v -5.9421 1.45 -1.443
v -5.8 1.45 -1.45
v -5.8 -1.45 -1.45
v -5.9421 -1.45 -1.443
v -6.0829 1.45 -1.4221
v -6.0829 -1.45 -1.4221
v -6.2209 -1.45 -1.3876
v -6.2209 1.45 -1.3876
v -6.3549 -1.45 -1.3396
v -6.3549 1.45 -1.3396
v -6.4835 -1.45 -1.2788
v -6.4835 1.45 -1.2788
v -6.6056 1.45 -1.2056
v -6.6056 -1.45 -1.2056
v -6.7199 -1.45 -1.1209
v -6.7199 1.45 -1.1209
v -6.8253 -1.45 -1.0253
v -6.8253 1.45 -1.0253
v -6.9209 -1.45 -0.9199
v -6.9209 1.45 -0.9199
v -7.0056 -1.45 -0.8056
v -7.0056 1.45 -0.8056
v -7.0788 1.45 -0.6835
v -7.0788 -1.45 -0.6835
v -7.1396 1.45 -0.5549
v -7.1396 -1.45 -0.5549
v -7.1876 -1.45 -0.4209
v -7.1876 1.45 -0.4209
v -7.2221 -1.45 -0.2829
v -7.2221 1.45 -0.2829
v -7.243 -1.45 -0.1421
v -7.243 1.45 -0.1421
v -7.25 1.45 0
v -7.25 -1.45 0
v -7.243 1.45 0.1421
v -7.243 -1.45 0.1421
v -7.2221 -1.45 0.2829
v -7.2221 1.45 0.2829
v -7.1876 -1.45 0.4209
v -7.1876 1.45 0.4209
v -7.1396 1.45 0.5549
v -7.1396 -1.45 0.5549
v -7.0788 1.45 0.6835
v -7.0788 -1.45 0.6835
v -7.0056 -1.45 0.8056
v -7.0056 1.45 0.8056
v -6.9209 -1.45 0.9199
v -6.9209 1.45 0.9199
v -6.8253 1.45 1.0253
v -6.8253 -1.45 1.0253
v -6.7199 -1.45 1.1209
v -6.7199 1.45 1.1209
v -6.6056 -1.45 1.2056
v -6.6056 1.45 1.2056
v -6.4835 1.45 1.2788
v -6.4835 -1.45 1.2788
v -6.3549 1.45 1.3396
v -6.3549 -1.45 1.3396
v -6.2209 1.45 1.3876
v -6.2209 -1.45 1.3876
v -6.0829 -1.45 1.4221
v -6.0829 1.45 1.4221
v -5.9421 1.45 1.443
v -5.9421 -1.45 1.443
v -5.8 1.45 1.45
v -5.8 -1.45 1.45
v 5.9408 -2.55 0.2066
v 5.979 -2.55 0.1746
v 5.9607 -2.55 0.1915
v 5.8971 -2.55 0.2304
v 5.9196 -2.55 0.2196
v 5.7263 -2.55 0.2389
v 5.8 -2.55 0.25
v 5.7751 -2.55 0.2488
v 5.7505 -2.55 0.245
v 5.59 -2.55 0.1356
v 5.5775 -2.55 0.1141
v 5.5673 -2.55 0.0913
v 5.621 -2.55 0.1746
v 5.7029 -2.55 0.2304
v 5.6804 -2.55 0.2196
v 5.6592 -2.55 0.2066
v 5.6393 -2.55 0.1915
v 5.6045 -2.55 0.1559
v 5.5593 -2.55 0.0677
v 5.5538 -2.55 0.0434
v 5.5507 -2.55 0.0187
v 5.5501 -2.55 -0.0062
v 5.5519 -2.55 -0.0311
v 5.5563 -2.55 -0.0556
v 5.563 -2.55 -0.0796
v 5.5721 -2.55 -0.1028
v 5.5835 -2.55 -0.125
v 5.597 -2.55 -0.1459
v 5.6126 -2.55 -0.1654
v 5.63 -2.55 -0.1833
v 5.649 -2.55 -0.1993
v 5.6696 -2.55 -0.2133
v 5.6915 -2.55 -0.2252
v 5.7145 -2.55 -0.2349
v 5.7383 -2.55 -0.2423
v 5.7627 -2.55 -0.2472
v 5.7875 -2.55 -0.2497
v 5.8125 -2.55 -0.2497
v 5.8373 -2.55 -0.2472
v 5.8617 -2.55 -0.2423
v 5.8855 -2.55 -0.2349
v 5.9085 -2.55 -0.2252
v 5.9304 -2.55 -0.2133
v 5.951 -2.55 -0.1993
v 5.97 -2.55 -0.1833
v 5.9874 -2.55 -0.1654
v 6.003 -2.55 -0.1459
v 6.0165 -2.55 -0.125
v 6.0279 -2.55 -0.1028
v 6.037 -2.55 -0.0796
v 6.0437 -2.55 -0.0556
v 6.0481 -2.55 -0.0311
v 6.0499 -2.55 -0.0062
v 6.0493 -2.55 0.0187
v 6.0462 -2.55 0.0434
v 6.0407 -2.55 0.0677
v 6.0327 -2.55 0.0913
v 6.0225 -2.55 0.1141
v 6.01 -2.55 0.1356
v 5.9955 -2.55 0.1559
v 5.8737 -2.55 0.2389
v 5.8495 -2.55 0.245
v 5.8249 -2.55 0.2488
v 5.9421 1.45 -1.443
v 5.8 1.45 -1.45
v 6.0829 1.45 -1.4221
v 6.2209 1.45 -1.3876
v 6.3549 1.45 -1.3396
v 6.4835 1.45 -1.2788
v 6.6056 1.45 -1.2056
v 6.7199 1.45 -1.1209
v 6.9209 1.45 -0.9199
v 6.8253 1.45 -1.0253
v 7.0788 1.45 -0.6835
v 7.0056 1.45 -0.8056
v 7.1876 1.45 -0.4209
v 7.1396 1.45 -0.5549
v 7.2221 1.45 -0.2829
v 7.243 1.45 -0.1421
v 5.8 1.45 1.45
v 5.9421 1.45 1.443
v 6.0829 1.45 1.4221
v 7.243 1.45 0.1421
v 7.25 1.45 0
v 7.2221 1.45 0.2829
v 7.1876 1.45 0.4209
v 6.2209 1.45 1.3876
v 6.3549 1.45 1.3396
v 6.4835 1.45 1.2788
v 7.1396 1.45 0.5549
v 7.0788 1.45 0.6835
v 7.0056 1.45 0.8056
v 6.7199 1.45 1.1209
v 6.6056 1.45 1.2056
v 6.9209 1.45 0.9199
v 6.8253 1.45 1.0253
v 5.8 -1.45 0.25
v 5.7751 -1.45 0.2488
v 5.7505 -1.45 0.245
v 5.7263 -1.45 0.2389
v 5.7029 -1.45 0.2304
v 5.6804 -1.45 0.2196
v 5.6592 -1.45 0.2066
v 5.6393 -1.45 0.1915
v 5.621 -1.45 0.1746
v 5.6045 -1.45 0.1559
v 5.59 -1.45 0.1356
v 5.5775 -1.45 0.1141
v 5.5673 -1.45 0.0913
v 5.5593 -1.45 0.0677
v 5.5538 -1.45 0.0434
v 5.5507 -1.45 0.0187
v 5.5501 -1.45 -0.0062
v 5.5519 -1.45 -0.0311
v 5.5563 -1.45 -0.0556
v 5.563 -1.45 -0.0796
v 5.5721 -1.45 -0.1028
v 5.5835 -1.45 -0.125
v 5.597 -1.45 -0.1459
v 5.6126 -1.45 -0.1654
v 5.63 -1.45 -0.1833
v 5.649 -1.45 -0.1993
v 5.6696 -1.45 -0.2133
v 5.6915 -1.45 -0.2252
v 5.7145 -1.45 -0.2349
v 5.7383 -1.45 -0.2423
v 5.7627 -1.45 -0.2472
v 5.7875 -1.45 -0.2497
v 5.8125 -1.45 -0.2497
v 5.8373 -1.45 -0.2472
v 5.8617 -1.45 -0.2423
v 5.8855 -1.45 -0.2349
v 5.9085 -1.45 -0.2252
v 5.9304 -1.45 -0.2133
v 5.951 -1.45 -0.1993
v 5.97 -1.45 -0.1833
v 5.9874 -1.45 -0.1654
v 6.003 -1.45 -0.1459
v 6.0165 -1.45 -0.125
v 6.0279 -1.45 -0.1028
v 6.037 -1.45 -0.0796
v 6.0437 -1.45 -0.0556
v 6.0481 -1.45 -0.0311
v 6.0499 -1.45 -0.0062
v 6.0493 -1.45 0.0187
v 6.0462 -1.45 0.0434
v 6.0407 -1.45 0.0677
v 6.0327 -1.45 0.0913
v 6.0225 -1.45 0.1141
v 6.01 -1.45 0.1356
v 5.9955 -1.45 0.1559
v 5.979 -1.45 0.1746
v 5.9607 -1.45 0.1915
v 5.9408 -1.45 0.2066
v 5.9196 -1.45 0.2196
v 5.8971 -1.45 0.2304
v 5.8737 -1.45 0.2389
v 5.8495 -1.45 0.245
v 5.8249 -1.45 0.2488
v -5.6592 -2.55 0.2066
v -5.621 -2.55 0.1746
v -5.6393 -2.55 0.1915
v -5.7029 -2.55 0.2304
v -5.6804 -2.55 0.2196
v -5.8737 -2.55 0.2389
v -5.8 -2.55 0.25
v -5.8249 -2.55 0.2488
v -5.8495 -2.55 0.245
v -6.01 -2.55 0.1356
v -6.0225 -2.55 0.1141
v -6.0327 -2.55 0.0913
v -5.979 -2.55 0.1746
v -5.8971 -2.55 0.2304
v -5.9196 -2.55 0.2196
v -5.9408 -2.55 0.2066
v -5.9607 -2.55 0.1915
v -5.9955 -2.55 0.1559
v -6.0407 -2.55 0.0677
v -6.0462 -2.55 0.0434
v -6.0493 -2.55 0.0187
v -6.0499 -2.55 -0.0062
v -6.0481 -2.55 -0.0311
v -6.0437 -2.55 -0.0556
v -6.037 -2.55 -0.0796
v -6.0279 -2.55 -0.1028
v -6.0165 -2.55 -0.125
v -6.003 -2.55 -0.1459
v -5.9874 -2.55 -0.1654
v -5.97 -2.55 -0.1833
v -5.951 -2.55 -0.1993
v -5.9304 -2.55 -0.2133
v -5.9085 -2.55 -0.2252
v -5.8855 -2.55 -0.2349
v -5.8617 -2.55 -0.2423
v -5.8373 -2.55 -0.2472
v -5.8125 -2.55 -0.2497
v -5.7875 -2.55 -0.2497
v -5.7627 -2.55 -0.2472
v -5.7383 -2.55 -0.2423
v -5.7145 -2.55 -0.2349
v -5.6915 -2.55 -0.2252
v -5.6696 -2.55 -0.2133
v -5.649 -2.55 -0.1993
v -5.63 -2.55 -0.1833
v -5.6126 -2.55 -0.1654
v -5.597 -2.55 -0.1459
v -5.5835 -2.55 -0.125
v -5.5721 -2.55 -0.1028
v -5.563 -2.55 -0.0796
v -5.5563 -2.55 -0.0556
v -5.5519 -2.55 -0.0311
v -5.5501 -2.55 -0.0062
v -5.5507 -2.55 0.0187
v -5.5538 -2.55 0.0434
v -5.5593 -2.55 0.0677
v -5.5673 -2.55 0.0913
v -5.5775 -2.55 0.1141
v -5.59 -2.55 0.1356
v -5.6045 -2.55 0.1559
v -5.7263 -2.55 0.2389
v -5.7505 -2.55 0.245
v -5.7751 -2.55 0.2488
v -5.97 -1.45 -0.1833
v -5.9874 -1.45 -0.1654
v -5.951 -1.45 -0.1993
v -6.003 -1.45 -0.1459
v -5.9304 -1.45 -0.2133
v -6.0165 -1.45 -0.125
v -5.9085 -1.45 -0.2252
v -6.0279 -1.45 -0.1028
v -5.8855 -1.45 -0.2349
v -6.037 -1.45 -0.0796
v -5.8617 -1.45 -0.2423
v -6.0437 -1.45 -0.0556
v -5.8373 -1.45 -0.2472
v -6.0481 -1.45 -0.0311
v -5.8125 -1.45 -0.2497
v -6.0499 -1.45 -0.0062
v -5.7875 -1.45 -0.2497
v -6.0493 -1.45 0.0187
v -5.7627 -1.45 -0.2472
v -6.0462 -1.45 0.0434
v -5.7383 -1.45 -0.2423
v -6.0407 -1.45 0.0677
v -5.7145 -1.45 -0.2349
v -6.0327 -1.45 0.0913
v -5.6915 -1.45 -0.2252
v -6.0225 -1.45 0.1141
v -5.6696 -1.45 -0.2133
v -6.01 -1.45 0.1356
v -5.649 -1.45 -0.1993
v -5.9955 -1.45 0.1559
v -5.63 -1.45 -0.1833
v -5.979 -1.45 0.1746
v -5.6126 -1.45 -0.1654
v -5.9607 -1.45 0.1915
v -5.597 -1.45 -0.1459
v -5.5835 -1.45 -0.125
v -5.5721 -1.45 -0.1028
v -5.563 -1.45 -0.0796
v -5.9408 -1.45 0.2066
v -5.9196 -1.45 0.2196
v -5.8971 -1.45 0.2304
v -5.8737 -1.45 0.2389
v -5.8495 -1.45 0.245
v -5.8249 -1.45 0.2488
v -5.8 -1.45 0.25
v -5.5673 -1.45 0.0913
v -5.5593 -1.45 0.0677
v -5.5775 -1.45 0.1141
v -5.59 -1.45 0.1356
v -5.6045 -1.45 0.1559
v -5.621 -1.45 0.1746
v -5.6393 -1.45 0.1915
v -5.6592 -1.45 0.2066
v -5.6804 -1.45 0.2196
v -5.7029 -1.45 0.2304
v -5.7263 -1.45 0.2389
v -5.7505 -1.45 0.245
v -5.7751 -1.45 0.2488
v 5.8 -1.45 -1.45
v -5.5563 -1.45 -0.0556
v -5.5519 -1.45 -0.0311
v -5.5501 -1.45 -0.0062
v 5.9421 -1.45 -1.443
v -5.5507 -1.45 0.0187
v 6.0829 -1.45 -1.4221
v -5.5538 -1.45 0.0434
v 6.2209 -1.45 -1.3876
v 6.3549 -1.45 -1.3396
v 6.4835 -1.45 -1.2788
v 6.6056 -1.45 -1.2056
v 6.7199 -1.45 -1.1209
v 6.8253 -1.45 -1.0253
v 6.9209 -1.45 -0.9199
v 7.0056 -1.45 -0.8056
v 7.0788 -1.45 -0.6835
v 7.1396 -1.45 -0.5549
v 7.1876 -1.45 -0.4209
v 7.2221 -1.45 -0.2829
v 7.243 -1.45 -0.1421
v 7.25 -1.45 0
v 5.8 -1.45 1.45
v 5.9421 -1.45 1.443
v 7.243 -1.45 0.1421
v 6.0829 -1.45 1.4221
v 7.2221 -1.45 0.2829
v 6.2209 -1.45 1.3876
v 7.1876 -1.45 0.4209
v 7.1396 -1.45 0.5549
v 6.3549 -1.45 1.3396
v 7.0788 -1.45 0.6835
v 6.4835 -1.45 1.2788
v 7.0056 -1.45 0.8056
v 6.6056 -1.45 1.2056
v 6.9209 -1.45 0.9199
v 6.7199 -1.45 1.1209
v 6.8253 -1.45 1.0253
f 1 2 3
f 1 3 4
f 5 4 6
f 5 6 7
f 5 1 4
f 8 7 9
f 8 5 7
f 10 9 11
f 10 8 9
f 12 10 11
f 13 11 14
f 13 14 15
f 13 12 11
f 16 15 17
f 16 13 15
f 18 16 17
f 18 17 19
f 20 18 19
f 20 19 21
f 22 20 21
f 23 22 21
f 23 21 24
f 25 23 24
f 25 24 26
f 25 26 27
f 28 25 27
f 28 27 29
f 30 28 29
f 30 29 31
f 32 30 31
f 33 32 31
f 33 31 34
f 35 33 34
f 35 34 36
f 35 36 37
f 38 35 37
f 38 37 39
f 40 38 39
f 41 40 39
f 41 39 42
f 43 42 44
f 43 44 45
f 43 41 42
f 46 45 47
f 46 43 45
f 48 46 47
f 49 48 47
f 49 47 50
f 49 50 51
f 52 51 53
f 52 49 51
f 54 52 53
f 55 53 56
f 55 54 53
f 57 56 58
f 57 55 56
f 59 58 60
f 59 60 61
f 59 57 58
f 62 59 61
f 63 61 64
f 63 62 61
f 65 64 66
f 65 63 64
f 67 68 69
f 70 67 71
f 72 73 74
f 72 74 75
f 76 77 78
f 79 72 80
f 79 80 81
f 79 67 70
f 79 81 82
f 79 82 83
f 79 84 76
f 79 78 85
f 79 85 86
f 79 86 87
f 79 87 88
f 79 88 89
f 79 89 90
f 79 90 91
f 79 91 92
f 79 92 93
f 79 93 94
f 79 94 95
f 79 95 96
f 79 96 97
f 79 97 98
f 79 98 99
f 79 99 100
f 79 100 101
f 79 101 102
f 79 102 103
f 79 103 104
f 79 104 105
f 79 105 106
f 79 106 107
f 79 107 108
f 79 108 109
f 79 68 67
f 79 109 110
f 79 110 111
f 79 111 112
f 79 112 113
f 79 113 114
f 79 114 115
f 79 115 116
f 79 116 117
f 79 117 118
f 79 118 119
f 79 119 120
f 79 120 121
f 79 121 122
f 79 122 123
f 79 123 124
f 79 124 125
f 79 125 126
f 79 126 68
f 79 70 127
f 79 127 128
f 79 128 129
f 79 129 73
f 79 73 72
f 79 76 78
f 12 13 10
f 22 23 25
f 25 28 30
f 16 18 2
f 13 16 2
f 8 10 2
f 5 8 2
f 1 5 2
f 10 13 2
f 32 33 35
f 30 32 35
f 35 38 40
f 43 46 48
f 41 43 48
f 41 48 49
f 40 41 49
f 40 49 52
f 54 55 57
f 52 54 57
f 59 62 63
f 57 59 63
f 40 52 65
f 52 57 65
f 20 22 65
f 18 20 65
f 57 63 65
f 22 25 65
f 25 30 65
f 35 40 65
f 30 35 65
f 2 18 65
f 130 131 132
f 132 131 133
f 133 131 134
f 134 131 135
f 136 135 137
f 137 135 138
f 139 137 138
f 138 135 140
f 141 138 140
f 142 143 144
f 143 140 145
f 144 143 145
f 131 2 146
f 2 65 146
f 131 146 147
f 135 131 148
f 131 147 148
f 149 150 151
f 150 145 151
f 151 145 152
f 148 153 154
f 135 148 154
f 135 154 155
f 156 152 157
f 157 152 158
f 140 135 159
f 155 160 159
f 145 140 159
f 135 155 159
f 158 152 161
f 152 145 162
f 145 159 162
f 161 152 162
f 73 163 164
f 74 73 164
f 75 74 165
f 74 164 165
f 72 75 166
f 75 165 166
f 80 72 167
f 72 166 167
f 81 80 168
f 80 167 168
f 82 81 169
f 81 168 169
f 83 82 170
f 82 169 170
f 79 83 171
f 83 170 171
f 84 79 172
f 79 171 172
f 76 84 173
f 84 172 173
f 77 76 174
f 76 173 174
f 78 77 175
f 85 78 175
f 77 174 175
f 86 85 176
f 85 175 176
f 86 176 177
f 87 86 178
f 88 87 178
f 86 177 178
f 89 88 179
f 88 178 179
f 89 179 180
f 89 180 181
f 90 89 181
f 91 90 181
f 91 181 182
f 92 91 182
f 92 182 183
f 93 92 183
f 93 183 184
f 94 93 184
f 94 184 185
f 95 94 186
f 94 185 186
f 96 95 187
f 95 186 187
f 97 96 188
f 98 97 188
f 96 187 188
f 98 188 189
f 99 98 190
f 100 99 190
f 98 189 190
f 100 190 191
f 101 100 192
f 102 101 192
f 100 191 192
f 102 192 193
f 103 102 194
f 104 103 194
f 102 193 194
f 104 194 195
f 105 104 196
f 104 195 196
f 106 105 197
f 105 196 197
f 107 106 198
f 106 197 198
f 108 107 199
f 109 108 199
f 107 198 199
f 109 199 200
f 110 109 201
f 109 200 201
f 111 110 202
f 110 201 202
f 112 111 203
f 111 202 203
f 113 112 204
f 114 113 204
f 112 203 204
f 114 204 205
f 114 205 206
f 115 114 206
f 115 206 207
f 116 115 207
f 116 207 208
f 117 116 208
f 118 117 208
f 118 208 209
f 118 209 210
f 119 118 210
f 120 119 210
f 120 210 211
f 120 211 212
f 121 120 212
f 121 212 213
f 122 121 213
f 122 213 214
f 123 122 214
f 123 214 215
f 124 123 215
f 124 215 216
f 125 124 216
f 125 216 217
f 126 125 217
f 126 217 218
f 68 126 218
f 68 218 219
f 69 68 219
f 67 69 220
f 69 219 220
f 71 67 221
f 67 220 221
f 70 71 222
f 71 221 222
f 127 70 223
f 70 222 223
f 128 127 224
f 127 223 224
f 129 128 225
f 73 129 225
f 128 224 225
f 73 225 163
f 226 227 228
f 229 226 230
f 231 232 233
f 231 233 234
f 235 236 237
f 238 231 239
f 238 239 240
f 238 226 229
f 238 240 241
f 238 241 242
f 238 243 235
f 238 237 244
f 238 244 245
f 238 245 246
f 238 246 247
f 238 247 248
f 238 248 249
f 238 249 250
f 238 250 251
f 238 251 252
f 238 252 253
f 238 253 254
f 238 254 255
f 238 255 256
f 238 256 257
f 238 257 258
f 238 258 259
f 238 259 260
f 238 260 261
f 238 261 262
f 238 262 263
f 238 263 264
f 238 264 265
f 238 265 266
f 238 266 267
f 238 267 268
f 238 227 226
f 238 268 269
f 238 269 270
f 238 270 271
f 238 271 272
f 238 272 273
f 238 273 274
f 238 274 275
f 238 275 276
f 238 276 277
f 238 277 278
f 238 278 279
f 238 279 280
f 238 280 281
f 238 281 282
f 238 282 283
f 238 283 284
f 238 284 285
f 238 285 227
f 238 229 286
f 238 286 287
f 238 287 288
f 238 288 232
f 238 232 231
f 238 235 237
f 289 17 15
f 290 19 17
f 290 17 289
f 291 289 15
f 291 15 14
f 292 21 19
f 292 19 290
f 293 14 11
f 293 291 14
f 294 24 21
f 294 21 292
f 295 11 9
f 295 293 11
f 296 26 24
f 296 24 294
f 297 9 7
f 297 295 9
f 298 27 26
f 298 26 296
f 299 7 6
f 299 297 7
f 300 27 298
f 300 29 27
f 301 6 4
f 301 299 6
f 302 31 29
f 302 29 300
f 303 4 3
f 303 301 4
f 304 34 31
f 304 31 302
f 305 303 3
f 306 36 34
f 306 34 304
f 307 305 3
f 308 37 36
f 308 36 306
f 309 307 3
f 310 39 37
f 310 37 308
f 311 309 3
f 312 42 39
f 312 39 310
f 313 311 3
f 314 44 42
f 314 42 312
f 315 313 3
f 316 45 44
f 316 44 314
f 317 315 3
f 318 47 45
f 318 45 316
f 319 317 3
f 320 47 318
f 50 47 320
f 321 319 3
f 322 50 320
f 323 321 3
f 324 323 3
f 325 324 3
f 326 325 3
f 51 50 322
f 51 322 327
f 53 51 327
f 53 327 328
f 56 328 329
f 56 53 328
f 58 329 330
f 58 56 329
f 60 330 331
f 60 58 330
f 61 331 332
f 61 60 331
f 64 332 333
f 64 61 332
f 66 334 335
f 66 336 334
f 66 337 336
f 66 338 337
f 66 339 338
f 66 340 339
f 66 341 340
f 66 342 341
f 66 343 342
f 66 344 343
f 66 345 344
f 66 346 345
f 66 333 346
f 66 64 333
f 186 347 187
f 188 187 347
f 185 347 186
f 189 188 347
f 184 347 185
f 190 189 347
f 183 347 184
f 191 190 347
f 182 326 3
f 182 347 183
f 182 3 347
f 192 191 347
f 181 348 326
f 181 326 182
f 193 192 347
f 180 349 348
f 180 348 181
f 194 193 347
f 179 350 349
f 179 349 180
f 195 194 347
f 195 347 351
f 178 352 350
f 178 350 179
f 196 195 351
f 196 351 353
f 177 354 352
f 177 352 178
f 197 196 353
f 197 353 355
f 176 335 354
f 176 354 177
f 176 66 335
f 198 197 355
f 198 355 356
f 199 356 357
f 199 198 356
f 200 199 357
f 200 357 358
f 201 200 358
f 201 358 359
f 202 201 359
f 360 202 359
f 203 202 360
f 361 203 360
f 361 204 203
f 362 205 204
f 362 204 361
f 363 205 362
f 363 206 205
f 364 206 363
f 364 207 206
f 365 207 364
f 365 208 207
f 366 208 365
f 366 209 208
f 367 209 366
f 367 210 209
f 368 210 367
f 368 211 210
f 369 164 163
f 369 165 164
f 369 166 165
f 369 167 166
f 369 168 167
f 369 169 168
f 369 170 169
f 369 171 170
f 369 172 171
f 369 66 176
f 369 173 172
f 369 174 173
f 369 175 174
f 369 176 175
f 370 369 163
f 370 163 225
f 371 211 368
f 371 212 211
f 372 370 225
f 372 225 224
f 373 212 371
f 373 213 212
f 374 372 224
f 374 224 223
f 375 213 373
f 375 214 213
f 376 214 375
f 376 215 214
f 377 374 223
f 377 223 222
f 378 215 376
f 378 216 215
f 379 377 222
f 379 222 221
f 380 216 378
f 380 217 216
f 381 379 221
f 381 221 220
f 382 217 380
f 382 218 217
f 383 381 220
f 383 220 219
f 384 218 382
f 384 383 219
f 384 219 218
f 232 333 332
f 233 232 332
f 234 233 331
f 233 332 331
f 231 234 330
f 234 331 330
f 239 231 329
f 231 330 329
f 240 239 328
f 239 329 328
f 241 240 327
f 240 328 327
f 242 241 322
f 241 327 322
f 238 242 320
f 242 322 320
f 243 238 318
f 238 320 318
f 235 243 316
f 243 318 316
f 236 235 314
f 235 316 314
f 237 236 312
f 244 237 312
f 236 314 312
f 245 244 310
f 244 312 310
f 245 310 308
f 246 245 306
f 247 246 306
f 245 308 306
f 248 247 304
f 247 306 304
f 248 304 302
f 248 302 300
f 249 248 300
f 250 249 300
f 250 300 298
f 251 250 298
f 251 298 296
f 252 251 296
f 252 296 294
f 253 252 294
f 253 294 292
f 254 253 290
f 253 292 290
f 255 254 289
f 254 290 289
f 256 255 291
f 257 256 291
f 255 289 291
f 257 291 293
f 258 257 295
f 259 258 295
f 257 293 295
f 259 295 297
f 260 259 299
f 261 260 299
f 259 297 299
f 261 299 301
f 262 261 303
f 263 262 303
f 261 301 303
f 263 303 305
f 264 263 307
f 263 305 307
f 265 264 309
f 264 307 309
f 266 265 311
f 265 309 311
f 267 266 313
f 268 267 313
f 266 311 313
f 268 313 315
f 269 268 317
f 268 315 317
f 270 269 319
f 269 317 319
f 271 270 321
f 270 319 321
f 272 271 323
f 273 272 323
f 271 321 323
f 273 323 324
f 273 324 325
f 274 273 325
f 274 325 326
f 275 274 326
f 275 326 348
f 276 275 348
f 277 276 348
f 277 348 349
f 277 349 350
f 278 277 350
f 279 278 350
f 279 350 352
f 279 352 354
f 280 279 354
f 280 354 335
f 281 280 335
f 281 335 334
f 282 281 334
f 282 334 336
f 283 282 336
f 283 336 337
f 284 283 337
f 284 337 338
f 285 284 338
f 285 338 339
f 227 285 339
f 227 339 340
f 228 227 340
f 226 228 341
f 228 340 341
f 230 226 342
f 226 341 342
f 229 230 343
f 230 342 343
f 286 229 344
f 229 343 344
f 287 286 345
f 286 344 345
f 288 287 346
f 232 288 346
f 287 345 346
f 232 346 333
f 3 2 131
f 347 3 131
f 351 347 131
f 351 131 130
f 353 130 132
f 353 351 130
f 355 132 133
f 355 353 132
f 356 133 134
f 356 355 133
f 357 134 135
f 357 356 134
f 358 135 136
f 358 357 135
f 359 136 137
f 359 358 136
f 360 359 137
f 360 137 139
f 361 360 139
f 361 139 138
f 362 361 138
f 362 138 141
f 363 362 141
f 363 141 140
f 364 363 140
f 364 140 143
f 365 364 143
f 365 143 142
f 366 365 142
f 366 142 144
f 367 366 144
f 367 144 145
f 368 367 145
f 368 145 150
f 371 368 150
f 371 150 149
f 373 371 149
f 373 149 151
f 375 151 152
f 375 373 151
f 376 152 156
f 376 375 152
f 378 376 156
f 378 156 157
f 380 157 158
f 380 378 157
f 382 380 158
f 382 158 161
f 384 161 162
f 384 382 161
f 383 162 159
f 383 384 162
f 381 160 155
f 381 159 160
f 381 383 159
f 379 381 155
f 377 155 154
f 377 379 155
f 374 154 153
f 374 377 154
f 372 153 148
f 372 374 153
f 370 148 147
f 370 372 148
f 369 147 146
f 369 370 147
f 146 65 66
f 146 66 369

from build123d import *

# Parameters (mm, degrees)
SKIZZE1_W                       = 14.5
SKIZZE1_H                       = 2.9
AUFSATZ_LINEAR_AUSTRAGEN1_DEPTH = 1.45
VERRUNDUNG1_RADIUS              = 1.45
VERRUNDUNG1_LENGTH              = 2.9
VERRUNDUNG2_RADIUS              = 1.45
VERRUNDUNG2_LENGTH              = 2.9
SKIZZE2_R                       = 0.25
AUFSATZ_LINEAR_AUSTRAGEN2_DEPTH = 1.1


with BuildPart() as part:
    # Skizze1 → Aufsatz-Linear austragen1 (new, symmetric)
    with BuildSketch(Plane.XY):
        Rectangle(SKIZZE1_W, SKIZZE1_H)
    extrude(amount=AUFSATZ_LINEAR_AUSTRAGEN1_DEPTH, both=True)

    # Verrundung1: full round fillet: the end face becomes a half cylinder, R = half its width
    verrundung1_face = Plane((7.25, 0, 0), x_dir=(0, -1, 0), z_dir=(1, 0, 0))  # on the end face: x along it, z out of the body
    verrundung1_slab = verrundung1_face.offset(-VERRUNDUNG1_RADIUS / 2) * Box(VERRUNDUNG1_LENGTH, 2 * VERRUNDUNG1_RADIUS, VERRUNDUNG1_RADIUS, mode=Mode.PRIVATE)  # the body's end, R deep
    verrundung1_round = Plane((5.8, 0, 0), x_dir=(1, 0, 0), z_dir=(0, -1, 0)) * Cylinder(VERRUNDUNG1_RADIUS, VERRUNDUNG1_LENGTH, mode=Mode.PRIVATE)  # its axis R under the face
    add(verrundung1_slab - verrundung1_round, mode=Mode.SUBTRACT)

    # Verrundung2: full round fillet: the end face becomes a half cylinder, R = half its width
    verrundung2_face = Plane((-7.25, 0, 0), x_dir=(0, 1, 0), z_dir=(-1, 0, 0))  # on the end face: x along it, z out of the body
    verrundung2_slab = verrundung2_face.offset(-VERRUNDUNG2_RADIUS / 2) * Box(VERRUNDUNG2_LENGTH, 2 * VERRUNDUNG2_RADIUS, VERRUNDUNG2_RADIUS, mode=Mode.PRIVATE)  # the body's end, R deep
    verrundung2_round = Plane((-5.8, 0, 0), x_dir=(-1, 0, 0), z_dir=(0, 1, 0)) * Cylinder(VERRUNDUNG2_RADIUS, VERRUNDUNG2_LENGTH, mode=Mode.PRIVATE)  # its axis R under the face
    add(verrundung2_slab - verrundung2_round, mode=Mode.SUBTRACT)

    # Skizze2 → Aufsatz-Linear austragen2 (add)
    with BuildSketch(Plane.XZ.offset(1.45)):
        with Locations(Location((-5.8, 0, 0), (0, 0, 90))):
            Circle(SKIZZE2_R)
        with Locations(Location((5.8, 0, 0), (0, 0, 90))):
            Circle(SKIZZE2_R)
    extrude(amount=AUFSATZ_LINEAR_AUSTRAGEN2_DEPTH)


solid = part.part
